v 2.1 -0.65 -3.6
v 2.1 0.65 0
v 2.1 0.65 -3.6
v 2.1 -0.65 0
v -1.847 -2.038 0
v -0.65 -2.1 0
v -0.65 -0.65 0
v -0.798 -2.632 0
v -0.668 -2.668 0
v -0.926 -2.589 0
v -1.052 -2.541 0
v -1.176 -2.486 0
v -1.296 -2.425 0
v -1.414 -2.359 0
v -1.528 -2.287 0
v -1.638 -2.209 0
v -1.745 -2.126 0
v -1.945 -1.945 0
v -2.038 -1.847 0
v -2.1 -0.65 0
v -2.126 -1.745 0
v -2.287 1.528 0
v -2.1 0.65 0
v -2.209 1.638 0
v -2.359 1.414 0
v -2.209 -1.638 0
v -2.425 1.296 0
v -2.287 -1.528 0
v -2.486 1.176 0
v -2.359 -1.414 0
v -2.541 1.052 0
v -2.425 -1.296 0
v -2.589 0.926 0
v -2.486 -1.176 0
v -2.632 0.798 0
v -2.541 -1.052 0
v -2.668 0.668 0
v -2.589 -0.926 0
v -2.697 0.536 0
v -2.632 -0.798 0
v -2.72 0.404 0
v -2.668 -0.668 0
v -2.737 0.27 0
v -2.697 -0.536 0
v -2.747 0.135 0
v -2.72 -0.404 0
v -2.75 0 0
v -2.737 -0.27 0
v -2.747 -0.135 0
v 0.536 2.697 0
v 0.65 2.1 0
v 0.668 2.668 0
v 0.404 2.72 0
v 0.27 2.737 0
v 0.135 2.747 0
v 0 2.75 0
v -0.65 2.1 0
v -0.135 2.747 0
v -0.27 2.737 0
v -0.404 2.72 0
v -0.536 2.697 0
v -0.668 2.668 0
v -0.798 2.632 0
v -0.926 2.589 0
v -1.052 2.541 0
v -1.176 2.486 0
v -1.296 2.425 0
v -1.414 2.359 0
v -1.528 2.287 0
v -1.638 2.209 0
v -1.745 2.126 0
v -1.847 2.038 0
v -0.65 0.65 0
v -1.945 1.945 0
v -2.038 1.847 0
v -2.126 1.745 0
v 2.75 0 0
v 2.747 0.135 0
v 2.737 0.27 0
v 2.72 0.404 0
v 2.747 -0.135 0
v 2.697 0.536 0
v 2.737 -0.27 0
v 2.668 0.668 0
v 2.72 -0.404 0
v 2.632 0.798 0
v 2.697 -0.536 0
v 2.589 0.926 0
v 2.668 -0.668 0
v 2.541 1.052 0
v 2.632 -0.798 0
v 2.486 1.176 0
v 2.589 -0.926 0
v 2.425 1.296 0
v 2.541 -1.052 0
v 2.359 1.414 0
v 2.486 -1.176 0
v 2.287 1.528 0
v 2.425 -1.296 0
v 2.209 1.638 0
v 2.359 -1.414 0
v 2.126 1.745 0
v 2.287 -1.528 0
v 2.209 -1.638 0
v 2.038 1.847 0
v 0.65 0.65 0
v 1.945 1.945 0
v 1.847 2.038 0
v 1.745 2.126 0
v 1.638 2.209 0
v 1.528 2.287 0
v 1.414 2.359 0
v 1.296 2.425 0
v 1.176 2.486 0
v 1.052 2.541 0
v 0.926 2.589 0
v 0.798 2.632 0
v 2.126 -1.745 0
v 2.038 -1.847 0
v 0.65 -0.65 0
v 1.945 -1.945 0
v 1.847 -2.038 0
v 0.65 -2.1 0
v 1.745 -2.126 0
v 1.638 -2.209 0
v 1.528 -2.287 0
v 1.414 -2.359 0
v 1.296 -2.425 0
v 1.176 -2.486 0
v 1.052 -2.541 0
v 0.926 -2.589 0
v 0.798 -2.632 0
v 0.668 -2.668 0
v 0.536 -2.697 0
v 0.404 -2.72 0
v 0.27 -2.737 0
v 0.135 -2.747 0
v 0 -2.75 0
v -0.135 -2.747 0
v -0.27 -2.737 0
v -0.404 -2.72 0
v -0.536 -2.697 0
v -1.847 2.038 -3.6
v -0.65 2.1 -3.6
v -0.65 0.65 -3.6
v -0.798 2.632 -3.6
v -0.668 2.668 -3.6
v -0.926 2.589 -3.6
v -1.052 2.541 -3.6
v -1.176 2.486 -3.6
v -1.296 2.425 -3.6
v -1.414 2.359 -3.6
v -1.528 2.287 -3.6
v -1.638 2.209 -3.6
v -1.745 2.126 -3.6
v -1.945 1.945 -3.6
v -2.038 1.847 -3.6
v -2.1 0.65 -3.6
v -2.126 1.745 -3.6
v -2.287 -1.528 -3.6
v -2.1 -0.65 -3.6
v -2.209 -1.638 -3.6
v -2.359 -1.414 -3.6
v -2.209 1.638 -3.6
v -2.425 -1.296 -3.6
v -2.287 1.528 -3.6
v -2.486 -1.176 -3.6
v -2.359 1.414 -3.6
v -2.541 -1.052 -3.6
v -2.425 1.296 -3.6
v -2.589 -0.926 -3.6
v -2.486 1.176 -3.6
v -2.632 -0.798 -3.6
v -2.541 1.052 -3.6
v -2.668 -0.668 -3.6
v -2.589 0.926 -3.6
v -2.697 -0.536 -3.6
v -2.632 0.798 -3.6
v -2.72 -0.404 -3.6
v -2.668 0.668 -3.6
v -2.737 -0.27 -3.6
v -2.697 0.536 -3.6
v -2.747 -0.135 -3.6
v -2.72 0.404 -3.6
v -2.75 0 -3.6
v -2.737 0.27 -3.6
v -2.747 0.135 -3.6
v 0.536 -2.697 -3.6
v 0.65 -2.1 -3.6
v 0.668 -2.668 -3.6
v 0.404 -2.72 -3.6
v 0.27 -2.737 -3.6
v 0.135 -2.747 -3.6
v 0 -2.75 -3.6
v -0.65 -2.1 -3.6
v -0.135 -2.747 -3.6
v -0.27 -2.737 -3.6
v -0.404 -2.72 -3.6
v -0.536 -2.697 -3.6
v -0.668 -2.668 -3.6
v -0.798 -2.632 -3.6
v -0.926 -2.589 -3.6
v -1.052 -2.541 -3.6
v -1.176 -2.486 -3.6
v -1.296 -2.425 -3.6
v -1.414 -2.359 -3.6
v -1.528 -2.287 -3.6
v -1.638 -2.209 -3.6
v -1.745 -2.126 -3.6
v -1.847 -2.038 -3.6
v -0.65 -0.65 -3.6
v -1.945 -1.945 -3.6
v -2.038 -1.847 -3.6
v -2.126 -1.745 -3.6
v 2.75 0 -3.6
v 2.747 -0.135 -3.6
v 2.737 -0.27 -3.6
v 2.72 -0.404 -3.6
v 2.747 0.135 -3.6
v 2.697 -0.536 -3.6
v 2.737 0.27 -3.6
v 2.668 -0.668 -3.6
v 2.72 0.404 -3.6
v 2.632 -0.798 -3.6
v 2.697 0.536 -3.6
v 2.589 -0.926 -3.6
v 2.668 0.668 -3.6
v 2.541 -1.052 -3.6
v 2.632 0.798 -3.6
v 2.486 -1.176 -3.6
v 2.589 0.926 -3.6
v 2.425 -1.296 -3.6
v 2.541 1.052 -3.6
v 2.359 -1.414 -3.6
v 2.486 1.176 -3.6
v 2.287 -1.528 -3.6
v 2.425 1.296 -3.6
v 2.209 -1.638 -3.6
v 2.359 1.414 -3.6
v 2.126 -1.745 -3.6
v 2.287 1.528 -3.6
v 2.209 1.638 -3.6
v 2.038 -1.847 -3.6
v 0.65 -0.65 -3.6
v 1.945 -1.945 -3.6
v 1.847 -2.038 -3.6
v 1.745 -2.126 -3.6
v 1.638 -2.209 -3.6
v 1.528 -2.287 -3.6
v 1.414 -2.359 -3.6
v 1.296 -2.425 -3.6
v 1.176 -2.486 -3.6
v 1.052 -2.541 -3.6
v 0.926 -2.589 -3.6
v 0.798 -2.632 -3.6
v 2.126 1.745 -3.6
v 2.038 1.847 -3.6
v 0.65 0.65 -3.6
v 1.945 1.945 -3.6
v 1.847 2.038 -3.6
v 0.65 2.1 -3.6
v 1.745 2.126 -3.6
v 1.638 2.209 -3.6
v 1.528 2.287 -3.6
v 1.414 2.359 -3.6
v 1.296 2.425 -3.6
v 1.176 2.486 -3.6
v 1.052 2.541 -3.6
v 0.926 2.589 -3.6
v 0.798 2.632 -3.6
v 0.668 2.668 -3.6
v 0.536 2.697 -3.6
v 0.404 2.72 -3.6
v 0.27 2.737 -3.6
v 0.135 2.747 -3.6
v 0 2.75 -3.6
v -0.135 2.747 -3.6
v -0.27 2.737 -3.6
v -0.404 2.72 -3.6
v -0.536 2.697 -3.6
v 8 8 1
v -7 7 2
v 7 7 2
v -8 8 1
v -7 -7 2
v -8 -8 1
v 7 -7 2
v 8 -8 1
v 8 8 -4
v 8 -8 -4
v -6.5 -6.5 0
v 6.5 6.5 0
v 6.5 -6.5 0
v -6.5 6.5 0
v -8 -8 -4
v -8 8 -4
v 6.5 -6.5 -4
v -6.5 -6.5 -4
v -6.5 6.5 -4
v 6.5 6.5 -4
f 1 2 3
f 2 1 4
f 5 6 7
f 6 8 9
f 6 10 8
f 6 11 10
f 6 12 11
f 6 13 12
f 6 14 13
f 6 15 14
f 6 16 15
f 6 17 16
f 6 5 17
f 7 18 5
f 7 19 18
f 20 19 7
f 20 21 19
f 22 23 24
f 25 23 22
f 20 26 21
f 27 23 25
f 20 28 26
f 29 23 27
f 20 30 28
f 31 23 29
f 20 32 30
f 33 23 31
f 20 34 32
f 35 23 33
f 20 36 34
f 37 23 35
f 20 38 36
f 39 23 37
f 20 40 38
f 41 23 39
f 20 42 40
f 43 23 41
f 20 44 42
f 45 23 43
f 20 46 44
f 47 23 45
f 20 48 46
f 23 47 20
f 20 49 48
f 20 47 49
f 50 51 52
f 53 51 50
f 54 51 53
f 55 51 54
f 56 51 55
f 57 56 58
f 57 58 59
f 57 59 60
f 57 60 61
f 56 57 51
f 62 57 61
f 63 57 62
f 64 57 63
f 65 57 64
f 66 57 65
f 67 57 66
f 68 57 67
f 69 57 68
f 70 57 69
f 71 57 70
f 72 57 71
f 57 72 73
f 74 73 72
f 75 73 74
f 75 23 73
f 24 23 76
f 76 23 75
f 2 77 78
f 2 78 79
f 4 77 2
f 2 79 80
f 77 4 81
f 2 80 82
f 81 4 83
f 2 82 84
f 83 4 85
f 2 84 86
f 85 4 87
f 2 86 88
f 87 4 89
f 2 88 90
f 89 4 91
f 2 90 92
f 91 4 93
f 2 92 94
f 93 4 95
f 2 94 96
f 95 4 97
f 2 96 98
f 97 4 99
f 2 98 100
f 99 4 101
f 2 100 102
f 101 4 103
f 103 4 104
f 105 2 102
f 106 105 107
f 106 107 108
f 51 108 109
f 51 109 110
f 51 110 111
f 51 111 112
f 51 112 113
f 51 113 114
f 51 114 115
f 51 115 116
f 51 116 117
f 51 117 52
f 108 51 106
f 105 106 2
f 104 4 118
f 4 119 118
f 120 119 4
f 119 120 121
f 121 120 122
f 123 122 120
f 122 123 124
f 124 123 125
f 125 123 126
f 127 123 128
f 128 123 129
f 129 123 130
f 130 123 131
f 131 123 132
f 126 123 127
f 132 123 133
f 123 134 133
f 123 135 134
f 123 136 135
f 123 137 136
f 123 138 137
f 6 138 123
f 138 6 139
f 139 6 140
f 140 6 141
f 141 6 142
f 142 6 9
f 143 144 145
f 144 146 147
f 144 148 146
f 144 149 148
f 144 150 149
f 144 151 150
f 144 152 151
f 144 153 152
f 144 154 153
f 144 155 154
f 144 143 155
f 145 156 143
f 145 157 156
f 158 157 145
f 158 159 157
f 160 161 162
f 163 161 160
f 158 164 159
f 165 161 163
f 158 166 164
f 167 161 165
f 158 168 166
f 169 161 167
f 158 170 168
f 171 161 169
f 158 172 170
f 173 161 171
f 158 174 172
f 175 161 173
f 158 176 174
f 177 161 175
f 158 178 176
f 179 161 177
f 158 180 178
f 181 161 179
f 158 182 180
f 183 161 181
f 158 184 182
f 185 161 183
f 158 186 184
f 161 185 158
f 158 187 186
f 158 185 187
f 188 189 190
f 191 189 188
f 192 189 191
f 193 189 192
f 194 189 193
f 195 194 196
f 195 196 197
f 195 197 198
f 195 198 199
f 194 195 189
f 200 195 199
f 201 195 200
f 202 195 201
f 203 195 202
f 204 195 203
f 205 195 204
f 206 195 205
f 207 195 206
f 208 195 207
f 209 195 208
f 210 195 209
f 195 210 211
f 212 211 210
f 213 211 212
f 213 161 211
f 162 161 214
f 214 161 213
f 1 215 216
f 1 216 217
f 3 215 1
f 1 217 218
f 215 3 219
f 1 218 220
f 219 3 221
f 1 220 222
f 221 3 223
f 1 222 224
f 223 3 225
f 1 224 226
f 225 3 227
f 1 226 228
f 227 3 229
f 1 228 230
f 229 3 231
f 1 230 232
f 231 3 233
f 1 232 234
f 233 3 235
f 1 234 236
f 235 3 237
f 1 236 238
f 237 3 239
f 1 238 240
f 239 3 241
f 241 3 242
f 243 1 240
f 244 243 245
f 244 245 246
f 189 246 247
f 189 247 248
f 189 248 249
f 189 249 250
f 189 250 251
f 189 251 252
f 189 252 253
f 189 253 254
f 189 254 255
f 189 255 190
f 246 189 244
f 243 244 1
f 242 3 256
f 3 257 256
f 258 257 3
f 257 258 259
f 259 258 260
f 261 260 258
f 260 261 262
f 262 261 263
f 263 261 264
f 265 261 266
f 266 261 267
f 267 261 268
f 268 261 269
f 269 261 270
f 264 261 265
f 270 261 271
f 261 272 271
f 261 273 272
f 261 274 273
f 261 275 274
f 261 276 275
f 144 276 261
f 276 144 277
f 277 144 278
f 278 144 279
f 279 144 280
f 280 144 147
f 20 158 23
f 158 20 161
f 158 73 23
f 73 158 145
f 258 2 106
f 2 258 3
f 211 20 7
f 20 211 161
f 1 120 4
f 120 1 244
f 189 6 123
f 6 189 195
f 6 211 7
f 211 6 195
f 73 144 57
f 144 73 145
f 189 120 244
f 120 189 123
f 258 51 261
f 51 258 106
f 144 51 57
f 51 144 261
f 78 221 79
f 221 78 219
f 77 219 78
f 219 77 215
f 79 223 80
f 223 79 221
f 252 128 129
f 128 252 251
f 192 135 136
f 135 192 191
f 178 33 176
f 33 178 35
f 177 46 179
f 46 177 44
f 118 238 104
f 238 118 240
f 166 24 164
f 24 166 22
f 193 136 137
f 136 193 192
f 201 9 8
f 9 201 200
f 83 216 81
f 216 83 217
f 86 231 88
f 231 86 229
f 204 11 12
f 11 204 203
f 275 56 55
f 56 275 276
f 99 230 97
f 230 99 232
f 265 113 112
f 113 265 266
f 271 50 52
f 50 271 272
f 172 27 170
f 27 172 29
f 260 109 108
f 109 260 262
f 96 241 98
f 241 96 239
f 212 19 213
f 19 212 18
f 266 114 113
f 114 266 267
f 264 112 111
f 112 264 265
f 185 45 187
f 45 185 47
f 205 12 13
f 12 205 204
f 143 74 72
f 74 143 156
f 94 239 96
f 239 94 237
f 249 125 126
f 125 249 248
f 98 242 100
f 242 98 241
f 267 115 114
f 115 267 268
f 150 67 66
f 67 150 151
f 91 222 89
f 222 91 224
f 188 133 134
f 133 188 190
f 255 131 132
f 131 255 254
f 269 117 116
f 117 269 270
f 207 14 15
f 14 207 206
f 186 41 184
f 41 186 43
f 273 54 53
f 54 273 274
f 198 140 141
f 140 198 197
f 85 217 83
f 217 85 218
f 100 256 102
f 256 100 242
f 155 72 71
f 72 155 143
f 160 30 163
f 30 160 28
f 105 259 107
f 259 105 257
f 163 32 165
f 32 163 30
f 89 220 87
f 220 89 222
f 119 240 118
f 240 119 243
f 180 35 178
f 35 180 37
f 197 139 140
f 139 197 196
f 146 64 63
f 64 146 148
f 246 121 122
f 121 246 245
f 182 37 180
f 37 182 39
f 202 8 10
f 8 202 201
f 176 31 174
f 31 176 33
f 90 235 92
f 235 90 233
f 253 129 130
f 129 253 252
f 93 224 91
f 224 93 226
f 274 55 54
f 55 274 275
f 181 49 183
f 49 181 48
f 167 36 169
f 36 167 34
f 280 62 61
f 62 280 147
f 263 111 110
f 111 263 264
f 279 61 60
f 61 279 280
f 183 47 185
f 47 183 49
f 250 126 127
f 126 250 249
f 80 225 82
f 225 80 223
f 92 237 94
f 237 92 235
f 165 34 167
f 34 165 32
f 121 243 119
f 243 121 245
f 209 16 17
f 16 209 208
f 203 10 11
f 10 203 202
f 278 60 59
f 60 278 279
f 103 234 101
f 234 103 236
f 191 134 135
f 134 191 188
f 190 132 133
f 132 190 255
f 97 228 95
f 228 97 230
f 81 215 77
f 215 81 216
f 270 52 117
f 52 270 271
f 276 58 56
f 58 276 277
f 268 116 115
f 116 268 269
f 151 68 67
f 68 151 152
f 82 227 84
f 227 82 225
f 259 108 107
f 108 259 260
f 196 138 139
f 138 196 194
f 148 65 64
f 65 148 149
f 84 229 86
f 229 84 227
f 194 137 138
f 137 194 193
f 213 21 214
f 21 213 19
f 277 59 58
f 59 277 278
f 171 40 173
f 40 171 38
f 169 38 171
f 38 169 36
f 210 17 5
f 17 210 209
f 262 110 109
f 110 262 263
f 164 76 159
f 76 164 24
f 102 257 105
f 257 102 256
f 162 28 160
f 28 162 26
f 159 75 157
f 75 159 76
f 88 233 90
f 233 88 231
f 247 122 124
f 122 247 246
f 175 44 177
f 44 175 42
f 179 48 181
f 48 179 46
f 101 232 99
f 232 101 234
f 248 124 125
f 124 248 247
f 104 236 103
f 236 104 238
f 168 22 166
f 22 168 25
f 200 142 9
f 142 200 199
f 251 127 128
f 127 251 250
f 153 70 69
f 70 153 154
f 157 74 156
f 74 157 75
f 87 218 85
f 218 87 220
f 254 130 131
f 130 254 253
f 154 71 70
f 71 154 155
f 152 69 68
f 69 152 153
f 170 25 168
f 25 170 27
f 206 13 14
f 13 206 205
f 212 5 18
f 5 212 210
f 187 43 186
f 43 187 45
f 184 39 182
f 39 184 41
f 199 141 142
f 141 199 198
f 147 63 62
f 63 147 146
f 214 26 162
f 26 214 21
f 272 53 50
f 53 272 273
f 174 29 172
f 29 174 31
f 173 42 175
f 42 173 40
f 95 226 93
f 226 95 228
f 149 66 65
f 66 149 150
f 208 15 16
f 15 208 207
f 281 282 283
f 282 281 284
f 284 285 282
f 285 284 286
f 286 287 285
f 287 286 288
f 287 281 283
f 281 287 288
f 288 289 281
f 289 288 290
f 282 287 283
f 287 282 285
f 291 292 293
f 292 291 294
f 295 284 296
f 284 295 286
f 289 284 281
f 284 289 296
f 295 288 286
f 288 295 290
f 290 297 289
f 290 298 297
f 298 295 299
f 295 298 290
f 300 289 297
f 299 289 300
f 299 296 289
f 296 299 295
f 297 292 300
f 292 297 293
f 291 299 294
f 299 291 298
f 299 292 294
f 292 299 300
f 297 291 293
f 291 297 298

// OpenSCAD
stem_h = 3.6;
union(){
translate([0,0,-stem_h/2])
   difference(){
      cylinder(h=stem_h,d=5.5,center=true,$fn=128);

      for(i=[0,90]){
         rotate([0,0,i])
            cube([4.2,1.3,stem_h],center=true);
      }
   }
difference(){
translate([0,0,1]) cube([16,16,2],center=true);
   for(i=[0:90:270]){
rotate([0,0,i])   
translate([0,8,2]) rotate([45,0,0]) cube([16,1*sqrt(2),1*sqrt(2)],center=true);}}

translate([0,0,-1.5])difference(){
   cube([16,16,5],center=true);
   cube([13,13,5],center=true);
   }
}
